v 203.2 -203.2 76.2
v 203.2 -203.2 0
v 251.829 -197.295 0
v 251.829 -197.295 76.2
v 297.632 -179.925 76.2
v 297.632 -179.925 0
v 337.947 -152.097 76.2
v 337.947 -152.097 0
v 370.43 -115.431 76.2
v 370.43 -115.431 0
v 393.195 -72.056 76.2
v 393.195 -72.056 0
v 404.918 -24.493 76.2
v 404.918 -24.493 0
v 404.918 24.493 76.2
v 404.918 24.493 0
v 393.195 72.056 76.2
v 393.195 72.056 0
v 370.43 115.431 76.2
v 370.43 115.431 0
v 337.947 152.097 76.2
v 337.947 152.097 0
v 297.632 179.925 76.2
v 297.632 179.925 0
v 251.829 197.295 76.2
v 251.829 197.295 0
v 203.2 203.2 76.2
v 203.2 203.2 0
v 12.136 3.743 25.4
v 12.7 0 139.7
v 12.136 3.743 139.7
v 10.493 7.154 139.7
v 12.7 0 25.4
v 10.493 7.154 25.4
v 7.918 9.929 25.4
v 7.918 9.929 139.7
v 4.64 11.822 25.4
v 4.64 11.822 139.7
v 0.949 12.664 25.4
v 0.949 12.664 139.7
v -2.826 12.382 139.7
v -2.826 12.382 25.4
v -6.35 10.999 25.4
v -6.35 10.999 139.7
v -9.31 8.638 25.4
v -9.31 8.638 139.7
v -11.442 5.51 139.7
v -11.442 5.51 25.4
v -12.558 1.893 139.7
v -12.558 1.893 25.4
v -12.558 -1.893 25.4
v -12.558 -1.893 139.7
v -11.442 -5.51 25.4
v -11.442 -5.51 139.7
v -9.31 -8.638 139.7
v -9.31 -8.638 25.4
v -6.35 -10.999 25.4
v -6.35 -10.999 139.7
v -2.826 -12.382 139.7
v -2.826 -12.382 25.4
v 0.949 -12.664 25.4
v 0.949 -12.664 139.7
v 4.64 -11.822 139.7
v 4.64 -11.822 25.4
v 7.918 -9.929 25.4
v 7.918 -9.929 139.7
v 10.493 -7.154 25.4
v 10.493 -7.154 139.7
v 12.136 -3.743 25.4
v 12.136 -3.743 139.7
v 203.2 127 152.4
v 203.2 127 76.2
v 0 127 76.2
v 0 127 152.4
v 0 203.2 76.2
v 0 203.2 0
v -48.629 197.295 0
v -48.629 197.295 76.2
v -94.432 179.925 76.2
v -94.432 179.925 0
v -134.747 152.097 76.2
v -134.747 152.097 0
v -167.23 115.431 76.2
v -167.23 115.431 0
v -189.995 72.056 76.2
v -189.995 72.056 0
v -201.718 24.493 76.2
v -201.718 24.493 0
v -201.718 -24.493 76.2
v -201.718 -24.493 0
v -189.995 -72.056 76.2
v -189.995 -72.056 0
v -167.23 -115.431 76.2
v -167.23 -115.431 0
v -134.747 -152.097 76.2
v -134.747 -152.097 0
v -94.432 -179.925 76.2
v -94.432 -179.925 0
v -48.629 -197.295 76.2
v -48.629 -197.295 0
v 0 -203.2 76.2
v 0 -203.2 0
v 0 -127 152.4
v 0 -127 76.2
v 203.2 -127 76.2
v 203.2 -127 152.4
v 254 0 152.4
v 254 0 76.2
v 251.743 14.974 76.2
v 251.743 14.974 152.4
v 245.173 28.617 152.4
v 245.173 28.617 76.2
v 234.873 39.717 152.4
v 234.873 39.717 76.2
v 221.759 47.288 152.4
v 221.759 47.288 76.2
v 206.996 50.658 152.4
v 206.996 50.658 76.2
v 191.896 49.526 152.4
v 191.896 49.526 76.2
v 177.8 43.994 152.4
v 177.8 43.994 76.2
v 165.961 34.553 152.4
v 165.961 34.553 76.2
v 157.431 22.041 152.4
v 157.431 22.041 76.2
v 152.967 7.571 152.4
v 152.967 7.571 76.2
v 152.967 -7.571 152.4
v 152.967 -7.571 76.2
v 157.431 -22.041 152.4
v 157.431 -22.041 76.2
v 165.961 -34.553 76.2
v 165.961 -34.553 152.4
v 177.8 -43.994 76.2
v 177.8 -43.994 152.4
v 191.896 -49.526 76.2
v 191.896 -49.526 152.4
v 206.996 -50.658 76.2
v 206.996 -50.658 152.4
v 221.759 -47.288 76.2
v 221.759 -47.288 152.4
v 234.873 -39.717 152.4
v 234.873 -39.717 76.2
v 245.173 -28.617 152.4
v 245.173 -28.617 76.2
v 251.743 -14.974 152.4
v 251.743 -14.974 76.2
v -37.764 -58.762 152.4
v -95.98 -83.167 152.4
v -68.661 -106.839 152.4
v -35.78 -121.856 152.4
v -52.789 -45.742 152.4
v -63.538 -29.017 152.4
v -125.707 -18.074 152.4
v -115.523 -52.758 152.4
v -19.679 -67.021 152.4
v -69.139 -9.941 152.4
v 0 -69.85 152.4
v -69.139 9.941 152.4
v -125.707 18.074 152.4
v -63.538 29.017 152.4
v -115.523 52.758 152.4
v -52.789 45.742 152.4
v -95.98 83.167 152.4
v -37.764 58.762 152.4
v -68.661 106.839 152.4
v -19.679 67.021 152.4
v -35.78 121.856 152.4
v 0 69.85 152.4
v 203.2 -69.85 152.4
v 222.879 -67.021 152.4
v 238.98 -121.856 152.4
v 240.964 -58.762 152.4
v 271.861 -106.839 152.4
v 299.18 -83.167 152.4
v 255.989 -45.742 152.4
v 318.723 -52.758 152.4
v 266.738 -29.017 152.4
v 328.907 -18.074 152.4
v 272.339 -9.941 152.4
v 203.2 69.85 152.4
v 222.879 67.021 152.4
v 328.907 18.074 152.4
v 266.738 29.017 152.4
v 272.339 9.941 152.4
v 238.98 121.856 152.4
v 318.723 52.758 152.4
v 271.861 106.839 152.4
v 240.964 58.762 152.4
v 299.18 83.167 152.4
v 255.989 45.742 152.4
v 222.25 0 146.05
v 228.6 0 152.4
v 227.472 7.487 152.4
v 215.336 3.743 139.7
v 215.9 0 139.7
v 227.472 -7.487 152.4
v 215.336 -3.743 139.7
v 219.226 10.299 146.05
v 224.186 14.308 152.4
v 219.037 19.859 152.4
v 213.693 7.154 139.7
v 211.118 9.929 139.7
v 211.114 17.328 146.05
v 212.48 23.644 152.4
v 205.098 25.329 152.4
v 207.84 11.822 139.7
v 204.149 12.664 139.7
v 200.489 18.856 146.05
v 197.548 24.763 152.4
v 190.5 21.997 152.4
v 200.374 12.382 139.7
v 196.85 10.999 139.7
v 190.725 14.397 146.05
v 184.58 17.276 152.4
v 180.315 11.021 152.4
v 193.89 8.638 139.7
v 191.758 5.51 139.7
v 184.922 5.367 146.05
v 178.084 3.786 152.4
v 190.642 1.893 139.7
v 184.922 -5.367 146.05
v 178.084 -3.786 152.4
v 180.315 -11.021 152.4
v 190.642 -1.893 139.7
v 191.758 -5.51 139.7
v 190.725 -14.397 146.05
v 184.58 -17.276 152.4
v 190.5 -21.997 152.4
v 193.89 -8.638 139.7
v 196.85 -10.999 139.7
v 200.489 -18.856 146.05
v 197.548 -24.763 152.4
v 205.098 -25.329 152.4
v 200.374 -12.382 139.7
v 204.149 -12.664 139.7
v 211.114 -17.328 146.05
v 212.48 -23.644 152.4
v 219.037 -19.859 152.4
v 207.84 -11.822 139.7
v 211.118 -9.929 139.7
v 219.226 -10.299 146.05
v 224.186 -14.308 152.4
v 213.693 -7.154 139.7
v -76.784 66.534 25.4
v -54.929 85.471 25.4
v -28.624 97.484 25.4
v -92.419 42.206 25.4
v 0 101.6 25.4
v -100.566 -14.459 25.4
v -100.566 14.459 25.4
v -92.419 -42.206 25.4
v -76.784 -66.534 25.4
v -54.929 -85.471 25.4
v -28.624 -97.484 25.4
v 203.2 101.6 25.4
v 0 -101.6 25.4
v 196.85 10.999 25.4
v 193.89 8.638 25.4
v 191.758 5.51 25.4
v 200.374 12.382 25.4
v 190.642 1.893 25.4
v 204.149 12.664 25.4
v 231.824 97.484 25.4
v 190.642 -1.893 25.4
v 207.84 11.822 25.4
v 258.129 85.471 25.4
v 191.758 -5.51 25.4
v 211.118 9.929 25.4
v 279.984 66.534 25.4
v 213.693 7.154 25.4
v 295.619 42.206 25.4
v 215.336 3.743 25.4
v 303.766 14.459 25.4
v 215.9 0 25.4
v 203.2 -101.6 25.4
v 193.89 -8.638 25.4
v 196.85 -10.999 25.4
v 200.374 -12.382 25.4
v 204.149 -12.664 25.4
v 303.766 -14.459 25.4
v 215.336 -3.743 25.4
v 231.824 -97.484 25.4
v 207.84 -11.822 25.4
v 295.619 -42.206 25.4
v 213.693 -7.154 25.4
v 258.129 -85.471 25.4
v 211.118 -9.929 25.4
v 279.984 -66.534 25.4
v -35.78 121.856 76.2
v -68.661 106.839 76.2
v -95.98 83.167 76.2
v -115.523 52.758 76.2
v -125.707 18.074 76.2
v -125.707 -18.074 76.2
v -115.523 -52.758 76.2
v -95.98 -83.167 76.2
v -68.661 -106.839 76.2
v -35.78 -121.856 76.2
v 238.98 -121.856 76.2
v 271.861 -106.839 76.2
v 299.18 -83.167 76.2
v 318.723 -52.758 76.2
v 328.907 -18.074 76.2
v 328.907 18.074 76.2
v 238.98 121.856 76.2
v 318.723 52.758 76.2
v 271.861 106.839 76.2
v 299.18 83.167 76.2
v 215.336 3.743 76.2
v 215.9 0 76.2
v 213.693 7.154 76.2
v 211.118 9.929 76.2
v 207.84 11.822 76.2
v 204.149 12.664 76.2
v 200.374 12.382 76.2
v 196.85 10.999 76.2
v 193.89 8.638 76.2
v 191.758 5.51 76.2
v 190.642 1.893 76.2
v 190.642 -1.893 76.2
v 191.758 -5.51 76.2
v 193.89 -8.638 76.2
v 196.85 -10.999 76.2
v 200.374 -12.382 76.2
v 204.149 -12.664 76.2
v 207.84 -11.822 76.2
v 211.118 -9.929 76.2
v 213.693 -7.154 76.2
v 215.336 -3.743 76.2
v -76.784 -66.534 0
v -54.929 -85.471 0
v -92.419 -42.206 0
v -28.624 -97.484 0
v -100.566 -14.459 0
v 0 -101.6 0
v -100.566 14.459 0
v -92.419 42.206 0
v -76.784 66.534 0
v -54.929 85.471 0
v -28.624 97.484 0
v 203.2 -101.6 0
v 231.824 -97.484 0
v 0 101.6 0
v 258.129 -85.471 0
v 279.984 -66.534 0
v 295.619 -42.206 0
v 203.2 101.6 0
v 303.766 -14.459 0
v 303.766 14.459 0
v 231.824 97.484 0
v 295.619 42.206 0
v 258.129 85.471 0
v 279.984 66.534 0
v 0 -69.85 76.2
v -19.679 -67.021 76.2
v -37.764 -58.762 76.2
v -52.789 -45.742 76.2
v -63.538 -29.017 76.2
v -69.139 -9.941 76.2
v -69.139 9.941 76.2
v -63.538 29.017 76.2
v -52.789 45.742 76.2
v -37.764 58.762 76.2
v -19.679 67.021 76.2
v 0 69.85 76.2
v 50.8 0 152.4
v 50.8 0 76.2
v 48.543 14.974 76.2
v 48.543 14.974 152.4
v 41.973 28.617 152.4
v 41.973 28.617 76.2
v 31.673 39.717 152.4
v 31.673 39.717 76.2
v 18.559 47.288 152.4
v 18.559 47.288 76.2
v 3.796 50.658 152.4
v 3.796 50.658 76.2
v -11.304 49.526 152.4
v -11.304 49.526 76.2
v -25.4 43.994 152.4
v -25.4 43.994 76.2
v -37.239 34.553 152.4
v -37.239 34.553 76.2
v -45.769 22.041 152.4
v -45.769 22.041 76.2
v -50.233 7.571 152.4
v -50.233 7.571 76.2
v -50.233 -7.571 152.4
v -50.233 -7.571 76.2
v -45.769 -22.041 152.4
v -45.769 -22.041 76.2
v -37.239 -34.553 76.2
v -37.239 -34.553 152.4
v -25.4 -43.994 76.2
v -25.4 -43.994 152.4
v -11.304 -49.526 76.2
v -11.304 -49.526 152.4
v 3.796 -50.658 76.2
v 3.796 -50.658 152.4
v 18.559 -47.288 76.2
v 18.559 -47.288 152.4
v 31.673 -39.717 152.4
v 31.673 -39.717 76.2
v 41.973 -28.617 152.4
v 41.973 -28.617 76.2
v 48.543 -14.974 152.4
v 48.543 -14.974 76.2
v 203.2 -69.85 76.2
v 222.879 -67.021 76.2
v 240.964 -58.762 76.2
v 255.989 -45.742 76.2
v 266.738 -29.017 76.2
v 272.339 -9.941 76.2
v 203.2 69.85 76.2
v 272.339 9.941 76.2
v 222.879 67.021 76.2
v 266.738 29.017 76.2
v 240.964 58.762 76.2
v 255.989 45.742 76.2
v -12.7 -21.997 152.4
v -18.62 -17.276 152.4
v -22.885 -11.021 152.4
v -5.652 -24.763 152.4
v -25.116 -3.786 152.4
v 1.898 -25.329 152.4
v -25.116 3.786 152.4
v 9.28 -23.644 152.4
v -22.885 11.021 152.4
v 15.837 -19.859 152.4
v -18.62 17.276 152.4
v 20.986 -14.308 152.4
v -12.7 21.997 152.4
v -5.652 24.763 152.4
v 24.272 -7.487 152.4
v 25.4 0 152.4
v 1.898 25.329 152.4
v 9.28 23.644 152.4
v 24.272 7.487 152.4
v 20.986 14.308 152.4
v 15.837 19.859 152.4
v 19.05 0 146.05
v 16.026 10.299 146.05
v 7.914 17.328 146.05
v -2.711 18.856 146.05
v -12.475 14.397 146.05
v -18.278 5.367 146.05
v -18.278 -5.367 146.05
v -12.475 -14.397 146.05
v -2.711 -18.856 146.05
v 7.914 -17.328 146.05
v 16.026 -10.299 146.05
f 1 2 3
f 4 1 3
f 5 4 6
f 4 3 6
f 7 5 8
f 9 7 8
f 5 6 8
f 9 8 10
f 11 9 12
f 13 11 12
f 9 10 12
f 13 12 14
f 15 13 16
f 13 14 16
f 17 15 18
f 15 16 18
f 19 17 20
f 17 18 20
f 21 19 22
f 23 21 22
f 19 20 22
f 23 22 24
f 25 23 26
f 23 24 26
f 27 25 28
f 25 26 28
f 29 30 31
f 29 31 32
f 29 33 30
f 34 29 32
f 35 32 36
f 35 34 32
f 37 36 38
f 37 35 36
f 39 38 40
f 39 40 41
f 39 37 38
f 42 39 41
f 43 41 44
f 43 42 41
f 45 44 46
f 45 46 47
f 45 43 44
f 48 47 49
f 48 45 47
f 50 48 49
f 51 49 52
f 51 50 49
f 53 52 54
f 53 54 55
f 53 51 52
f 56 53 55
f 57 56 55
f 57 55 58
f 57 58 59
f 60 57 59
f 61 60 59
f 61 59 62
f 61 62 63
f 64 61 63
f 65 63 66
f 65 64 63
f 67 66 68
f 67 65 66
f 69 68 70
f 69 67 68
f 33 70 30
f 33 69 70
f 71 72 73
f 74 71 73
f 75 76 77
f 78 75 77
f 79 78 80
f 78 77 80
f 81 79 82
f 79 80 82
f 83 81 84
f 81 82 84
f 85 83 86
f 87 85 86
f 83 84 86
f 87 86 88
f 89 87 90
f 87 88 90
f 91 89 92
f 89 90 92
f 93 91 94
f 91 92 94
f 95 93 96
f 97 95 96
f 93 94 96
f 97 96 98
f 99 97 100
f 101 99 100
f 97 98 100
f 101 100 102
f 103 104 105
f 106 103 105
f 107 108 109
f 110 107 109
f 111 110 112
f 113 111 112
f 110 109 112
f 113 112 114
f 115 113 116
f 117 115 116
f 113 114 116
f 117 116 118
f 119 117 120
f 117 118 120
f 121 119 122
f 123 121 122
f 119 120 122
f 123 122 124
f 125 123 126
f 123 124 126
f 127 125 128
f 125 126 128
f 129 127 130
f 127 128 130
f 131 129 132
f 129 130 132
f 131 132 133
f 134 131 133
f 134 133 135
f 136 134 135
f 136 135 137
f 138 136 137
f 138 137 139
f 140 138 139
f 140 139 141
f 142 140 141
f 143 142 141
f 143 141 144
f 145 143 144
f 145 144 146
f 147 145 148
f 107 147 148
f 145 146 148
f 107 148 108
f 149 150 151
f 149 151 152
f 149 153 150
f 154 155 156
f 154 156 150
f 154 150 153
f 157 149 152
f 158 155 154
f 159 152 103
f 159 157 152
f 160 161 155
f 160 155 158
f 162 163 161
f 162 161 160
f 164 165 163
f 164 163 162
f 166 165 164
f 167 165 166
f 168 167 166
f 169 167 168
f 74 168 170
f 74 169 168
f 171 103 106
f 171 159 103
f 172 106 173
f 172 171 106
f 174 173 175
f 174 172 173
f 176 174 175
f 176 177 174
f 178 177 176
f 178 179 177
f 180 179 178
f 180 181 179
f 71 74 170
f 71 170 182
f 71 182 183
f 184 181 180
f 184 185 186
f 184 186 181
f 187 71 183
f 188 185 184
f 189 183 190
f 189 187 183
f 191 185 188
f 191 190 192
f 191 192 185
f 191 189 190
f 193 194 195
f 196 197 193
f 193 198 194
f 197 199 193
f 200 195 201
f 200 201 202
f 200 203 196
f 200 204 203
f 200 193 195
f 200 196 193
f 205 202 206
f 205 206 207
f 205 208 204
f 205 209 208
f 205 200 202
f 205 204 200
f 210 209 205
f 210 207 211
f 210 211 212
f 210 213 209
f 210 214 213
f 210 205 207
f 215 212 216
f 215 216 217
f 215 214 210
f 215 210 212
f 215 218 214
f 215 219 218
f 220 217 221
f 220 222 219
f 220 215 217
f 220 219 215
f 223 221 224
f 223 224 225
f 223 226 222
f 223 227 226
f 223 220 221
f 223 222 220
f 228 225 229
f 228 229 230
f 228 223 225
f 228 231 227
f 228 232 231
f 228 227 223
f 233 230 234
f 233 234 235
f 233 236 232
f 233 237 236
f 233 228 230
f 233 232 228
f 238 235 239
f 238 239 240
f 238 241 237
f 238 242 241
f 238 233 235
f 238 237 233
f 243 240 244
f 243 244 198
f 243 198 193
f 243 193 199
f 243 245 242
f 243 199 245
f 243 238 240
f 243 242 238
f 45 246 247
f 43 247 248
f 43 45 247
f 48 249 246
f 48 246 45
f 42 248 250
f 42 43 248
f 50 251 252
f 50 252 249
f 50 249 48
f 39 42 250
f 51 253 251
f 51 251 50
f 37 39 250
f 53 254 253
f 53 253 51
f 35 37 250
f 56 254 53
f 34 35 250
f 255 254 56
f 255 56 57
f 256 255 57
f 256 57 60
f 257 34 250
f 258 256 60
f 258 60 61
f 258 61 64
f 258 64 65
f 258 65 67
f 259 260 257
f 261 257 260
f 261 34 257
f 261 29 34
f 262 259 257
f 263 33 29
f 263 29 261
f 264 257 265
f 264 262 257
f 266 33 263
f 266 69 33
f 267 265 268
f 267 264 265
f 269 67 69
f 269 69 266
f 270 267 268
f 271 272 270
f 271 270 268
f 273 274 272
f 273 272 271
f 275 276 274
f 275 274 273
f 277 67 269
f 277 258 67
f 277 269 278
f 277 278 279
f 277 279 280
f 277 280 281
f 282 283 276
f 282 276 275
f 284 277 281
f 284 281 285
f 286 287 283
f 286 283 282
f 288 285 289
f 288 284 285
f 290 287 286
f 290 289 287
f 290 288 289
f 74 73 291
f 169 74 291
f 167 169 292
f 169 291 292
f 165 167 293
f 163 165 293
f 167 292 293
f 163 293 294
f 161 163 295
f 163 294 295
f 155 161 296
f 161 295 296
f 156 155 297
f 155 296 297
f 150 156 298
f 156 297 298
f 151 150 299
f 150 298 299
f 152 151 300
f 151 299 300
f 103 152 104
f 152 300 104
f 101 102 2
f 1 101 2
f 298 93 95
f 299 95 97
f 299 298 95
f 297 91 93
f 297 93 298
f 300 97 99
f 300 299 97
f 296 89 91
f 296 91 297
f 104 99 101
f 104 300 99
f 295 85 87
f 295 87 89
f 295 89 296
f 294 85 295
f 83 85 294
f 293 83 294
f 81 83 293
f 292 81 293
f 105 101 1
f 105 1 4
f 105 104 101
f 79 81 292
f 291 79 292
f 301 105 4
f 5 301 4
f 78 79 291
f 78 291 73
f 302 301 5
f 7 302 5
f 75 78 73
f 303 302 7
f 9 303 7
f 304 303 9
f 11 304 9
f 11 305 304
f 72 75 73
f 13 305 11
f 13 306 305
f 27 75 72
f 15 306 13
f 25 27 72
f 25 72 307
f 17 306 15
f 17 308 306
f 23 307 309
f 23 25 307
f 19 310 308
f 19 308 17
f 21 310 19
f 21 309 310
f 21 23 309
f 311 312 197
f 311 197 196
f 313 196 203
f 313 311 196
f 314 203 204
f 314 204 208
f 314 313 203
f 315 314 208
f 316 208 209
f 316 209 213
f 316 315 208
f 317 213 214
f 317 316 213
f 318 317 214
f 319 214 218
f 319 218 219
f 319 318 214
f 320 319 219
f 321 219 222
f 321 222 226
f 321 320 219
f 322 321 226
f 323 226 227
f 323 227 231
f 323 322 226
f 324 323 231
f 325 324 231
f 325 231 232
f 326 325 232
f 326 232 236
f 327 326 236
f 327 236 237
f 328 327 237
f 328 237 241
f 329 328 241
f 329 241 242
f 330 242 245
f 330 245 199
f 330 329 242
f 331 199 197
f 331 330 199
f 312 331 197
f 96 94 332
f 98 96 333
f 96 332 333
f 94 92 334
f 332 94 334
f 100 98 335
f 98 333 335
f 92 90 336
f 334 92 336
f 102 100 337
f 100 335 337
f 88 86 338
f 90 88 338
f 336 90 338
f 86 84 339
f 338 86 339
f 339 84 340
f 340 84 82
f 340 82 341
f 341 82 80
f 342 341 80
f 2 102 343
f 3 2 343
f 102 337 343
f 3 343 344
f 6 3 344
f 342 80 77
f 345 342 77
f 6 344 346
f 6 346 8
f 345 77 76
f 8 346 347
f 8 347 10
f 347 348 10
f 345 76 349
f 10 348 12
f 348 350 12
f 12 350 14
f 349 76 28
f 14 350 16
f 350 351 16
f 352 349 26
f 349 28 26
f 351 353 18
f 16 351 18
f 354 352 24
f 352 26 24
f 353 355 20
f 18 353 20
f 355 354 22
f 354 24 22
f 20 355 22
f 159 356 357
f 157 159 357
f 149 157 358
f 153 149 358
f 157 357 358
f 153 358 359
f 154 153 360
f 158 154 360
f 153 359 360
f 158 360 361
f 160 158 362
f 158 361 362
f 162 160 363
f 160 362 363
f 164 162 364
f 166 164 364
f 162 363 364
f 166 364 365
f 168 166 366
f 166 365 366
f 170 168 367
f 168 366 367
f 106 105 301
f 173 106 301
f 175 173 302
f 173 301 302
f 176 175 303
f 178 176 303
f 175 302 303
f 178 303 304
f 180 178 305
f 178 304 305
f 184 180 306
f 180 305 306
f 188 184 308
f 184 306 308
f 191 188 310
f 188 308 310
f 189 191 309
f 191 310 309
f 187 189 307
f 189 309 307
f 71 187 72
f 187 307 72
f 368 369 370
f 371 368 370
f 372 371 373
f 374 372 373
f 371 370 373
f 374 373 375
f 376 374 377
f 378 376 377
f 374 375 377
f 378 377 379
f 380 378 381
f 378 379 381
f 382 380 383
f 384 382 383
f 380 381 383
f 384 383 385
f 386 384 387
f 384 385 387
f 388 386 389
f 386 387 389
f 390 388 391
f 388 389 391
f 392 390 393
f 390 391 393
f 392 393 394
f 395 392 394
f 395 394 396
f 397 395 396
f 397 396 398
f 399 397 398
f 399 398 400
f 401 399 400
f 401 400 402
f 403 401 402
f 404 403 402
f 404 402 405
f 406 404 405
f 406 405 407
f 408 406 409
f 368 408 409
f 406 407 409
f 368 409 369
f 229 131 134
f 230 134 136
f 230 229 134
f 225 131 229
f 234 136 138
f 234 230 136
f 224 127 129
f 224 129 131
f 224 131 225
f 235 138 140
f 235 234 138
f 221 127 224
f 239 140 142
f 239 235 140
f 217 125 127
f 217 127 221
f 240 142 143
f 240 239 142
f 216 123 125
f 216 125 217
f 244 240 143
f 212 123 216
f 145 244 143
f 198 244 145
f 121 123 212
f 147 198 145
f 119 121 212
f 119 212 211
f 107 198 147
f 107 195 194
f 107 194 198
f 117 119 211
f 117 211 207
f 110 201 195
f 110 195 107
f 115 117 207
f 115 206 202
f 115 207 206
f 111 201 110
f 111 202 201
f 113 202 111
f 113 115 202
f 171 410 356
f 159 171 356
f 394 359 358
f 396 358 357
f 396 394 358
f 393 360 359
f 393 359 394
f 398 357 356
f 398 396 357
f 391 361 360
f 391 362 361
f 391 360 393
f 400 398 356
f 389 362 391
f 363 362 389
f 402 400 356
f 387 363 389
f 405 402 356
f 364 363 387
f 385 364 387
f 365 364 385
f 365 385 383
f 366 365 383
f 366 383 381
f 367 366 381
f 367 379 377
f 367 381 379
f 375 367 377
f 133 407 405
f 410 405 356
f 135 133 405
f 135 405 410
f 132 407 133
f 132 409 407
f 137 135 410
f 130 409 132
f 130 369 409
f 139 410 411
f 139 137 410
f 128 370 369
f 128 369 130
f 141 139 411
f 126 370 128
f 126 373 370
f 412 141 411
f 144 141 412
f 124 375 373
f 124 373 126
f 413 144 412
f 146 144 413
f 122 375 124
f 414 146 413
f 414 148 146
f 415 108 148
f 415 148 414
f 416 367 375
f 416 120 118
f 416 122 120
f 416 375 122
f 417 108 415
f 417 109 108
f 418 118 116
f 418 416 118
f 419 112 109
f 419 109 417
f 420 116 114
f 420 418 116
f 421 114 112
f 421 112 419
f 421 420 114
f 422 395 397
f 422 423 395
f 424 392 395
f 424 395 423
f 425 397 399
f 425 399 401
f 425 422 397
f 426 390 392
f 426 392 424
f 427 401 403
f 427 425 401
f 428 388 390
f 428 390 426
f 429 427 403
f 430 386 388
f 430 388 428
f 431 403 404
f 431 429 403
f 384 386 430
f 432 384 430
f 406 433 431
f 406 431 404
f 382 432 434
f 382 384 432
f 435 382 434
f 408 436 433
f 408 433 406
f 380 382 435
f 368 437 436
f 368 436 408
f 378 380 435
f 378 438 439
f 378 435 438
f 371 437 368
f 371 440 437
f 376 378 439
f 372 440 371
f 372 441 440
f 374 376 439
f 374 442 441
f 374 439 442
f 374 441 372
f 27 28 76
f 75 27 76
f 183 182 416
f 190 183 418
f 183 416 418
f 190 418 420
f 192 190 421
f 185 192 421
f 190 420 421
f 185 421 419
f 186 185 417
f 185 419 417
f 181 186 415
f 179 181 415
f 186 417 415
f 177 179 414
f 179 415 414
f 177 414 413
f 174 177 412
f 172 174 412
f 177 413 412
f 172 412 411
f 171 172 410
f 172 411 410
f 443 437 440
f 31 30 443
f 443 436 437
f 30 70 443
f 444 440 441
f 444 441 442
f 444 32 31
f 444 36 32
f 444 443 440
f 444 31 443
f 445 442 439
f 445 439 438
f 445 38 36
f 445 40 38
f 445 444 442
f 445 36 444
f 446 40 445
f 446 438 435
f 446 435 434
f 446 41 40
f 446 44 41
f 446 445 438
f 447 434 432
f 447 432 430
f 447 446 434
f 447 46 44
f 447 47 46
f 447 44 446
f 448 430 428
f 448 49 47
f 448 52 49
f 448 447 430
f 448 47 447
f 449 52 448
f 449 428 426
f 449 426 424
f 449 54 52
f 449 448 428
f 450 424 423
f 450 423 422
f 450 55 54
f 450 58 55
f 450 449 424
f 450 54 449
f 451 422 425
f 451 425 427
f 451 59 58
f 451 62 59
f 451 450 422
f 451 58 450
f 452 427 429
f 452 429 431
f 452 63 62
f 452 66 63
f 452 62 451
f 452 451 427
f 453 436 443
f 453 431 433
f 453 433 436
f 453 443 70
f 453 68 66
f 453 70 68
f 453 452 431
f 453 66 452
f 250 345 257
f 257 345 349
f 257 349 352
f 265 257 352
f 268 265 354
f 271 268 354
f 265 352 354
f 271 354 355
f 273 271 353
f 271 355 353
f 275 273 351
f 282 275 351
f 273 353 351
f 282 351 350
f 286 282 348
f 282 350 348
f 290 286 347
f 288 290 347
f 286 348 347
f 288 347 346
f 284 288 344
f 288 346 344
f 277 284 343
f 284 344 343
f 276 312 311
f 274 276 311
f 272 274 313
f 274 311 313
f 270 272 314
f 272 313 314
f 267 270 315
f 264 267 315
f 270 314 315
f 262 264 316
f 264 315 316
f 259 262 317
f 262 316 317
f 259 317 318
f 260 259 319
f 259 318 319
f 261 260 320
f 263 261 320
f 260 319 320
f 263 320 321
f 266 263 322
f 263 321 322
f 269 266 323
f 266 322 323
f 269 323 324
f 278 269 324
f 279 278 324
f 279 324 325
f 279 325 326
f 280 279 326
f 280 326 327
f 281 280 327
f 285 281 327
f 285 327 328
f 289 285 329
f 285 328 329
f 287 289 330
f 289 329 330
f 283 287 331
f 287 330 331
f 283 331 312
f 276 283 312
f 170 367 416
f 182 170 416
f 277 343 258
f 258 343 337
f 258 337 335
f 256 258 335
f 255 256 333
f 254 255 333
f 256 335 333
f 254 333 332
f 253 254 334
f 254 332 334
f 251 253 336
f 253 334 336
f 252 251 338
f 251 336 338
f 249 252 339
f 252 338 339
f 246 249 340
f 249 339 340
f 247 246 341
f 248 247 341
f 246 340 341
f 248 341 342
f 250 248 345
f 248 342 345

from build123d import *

# Parameters (mm, degrees)
F1_DEPTH = 76.2
F2_R     = 50.8
F2_R_2   = 25.4
F2_R_3   = 12.7
F3_DEPTH = 76.2
F4_SIZE  = 12.7
F6_DEPTH = 25.4
F7_DEPTH = 50.8


with BuildPart() as f1:
    # F0 (on Top) → F1 (new body)
    with BuildSketch(Plane.XY):
        with BuildLine():
            Line((203.2, 203.2), (0, 203.2))
            ThreePointArc((0, 203.2), (-203.2, 0), (0, -203.2))
            Line((0, -203.2), (203.2, -203.2))
            ThreePointArc((203.2, -203.2), (406.4, 0), (203.2, 203.2))
        make_face()
    extrude(amount=F1_DEPTH)

    # F2 (on face) → F3 (join)
    with BuildSketch(Plane.XY.offset(76.2)):
        with BuildLine():
            Line((0, -127), (203.2, -127))
            ThreePointArc((203.2, -127), (330.2, 0), (203.2, 127))
            Line((203.2, 127), (0, 127))
            ThreePointArc((0, 127), (-127, 0), (0, -127))
        make_face()
        with BuildLine():
            ThreePointArc((0, -69.85), (-69.85, 0), (0, 69.85))
            Line((0, 69.85), (203.2, 69.85))
            ThreePointArc((203.2, 69.85), (273.05, 0), (203.2, -69.85))
            Line((203.2, -69.85), (0, -69.85))
        make_face(mode=Mode.SUBTRACT)
        Circle(F2_R)
        Circle(F2_R_2, mode=Mode.SUBTRACT)
        with Locations((203.2, 0)):
            Circle(F2_R)
        with Locations((203.2, 0)):
            Circle(F2_R_2, mode=Mode.SUBTRACT)
        Circle(F2_R_2)
        Circle(F2_R_3, mode=Mode.SUBTRACT)
        with Locations((203.2, 0)):
            Circle(F2_R_2)
        with Locations((203.2, 0)):
            Circle(F2_R_3, mode=Mode.SUBTRACT)
    extrude(amount=F3_DEPTH)

    # F4
    f4_edges = [f1.edges().sort_by_distance(p)[0] for p in [
        (-12.7, 0, 152.4),
        (190.5, 0, 152.4),
    ]]
    chamfer(f4_edges, length=F4_SIZE)

    # F5 (on face) → F6 (cut)
    with BuildSketch(Plane(origin=(0, 0, 0), x_dir=(1, 0, 0), z_dir=(0, 0, -1))):
        with BuildLine():
            Line((203.2, 101.6), (0, 101.6))
            ThreePointArc((0, 101.6), (-101.6, 0), (0, -101.6))
            Line((0, -101.6), (203.2, -101.6))
            ThreePointArc((203.2, -101.6), (304.8, 0), (203.2, 101.6))
        make_face()
    extrude(amount=-F6_DEPTH, mode=Mode.SUBTRACT)

    # F7 (cut): faces of the model
    f7_faces = [f1.faces().sort_by_distance(p)[0] for p in [
        (0, 0, 76.2),
        (203.2, 0, 76.2),
    ]]
    extrude(f7_faces, amount=-F7_DEPTH, mode=Mode.SUBTRACT)


solid = f1.part
